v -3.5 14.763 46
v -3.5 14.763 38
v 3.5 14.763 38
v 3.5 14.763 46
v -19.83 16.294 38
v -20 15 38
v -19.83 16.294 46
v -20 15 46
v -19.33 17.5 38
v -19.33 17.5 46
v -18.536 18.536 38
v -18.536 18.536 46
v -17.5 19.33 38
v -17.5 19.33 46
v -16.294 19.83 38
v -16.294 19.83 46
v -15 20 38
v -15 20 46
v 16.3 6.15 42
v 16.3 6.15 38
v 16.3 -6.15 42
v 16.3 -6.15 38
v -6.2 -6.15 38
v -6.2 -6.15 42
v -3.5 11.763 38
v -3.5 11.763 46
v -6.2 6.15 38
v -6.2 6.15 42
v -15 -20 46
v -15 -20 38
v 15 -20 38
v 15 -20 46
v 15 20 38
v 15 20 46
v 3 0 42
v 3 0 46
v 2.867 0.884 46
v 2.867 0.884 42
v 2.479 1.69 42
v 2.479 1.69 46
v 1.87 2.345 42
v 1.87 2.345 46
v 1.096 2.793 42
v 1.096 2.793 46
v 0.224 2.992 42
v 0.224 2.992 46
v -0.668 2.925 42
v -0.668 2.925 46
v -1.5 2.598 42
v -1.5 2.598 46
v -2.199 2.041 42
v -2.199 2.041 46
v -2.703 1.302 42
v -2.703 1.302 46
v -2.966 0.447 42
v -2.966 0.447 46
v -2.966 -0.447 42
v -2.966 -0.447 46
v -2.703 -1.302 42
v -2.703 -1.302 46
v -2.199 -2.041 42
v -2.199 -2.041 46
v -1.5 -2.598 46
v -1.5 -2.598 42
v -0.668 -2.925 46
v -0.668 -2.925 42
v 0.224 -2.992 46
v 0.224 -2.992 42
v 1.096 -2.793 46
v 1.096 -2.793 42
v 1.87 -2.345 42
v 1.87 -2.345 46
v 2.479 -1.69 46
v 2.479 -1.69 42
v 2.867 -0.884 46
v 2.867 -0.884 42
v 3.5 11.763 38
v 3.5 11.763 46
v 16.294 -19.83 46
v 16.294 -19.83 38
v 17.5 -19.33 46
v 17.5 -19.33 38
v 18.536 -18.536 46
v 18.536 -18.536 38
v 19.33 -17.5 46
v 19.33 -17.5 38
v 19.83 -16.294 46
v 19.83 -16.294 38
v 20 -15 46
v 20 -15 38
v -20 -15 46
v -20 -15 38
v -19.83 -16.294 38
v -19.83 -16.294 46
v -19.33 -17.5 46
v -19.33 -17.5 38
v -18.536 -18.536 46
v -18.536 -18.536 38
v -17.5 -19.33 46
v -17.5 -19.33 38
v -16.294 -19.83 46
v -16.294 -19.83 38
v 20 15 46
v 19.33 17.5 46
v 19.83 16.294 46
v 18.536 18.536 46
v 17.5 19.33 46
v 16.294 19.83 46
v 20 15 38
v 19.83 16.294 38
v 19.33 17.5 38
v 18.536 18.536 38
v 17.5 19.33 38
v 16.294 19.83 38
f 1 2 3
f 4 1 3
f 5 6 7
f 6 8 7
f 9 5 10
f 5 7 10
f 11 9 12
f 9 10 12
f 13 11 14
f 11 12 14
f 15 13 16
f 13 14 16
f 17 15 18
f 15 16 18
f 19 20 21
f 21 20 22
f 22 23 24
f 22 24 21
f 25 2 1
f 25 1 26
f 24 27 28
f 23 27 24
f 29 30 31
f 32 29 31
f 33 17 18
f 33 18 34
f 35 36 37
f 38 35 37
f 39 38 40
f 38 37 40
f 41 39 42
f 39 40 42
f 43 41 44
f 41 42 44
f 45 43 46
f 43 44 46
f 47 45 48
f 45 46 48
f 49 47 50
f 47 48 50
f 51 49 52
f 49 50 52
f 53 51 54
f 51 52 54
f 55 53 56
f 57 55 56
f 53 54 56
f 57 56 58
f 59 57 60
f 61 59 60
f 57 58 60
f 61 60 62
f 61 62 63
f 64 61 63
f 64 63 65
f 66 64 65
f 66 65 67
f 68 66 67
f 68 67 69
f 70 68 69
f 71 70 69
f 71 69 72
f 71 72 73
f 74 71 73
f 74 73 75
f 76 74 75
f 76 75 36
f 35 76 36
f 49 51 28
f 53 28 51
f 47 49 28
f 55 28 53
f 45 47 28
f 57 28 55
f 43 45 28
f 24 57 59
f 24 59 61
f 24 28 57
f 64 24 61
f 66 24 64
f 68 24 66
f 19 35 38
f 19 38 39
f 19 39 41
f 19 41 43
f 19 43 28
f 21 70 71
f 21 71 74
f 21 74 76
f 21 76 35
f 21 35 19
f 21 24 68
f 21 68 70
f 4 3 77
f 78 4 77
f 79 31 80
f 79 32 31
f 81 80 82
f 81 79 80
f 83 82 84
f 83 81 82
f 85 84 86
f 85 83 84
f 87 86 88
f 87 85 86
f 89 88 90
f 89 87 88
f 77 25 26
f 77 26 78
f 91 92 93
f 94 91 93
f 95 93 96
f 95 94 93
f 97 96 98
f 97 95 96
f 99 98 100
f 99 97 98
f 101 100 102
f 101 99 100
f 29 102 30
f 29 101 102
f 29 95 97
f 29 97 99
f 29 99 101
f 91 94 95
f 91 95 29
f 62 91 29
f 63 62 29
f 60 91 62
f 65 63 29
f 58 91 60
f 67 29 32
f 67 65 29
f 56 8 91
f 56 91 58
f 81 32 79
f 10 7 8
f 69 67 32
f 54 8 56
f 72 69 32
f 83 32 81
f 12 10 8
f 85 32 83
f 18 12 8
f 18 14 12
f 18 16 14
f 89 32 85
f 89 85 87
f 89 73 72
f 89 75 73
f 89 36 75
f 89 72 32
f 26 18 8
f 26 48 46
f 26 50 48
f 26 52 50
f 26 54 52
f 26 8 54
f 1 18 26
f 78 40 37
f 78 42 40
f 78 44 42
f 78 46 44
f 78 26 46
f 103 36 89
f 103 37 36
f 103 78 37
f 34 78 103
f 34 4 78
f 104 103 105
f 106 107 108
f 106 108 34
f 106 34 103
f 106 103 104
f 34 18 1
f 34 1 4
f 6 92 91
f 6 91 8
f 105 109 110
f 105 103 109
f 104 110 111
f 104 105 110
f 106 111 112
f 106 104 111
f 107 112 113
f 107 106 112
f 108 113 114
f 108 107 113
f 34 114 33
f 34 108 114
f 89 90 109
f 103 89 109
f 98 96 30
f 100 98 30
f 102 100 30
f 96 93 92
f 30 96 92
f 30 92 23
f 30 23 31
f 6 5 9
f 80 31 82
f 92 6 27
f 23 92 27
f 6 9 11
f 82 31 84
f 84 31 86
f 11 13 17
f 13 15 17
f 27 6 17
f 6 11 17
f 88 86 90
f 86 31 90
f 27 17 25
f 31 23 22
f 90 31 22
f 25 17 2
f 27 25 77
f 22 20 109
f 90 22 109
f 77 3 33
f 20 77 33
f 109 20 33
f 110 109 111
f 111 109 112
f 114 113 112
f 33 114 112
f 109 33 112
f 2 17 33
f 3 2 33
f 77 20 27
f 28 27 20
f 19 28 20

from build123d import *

# Parameters (mm, degrees)
SKETCH016_W     = 40
SKETCH016_H     = 40
PAD005_DEPTH    = 8
FILLET003_R     = 5
SKETCH017_W     = 22.5
SKETCH017_H     = 12.3
POCKET011_DEPTH = 4
SKETCH018_R     = 3
POCKET012_DEPTH = 5
SKETCH019_W     = 7
SKETCH019_H     = 3
POCKET013_DEPTH = 8


with BuildPart() as part:
    # Sketch016 → Pad005 (new body)
    with BuildSketch(Plane.XY):
        Rectangle(SKETCH016_W, SKETCH016_H)
    extrude(amount=PAD005_DEPTH)

    # Fillet003
    fillet003_edges = [part.edges().sort_by_distance(p)[0] for p in [
        (-20, -20, 4),
        (20, -20, 4),
        (20, 20, 4),
        (-20, 20, 4),
    ]]
    fillet(fillet003_edges, radius=FILLET003_R)

    # Sketch017 (on Face2 of Fillet003) → Pocket011 (cut)
    with BuildSketch(Plane(origin=(0, 0, 0), x_dir=(1, 0, 0), z_dir=(0, 0, -1))):
        with Locations((5.05, 0)):
            Rectangle(SKETCH017_W, SKETCH017_H)
    extrude(amount=-POCKET011_DEPTH, mode=Mode.SUBTRACT)

    # Sketch018 (on Face5 of Pocket011) → Pocket012 (cut)
    with BuildSketch(Plane.XY.offset(8)):
        Circle(SKETCH018_R)
    extrude(amount=-POCKET012_DEPTH, mode=Mode.SUBTRACT)

    # Sketch019 (on Face2 of Pocket012) → Pocket013 (cut)
    with BuildSketch(Plane(origin=(0, 0, 0), x_dir=(1, 0, 0), z_dir=(0, 0, -1))):
        with Locations((0, -13.263275)):
            Rectangle(SKETCH019_W, SKETCH019_H)
    extrude(amount=-POCKET013_DEPTH, mode=Mode.SUBTRACT)


with BuildPart() as part_1:
    # Body002 placement: moved
    add(part.part.moved(Location((0, 0, 38))))


solid = part_1.part
